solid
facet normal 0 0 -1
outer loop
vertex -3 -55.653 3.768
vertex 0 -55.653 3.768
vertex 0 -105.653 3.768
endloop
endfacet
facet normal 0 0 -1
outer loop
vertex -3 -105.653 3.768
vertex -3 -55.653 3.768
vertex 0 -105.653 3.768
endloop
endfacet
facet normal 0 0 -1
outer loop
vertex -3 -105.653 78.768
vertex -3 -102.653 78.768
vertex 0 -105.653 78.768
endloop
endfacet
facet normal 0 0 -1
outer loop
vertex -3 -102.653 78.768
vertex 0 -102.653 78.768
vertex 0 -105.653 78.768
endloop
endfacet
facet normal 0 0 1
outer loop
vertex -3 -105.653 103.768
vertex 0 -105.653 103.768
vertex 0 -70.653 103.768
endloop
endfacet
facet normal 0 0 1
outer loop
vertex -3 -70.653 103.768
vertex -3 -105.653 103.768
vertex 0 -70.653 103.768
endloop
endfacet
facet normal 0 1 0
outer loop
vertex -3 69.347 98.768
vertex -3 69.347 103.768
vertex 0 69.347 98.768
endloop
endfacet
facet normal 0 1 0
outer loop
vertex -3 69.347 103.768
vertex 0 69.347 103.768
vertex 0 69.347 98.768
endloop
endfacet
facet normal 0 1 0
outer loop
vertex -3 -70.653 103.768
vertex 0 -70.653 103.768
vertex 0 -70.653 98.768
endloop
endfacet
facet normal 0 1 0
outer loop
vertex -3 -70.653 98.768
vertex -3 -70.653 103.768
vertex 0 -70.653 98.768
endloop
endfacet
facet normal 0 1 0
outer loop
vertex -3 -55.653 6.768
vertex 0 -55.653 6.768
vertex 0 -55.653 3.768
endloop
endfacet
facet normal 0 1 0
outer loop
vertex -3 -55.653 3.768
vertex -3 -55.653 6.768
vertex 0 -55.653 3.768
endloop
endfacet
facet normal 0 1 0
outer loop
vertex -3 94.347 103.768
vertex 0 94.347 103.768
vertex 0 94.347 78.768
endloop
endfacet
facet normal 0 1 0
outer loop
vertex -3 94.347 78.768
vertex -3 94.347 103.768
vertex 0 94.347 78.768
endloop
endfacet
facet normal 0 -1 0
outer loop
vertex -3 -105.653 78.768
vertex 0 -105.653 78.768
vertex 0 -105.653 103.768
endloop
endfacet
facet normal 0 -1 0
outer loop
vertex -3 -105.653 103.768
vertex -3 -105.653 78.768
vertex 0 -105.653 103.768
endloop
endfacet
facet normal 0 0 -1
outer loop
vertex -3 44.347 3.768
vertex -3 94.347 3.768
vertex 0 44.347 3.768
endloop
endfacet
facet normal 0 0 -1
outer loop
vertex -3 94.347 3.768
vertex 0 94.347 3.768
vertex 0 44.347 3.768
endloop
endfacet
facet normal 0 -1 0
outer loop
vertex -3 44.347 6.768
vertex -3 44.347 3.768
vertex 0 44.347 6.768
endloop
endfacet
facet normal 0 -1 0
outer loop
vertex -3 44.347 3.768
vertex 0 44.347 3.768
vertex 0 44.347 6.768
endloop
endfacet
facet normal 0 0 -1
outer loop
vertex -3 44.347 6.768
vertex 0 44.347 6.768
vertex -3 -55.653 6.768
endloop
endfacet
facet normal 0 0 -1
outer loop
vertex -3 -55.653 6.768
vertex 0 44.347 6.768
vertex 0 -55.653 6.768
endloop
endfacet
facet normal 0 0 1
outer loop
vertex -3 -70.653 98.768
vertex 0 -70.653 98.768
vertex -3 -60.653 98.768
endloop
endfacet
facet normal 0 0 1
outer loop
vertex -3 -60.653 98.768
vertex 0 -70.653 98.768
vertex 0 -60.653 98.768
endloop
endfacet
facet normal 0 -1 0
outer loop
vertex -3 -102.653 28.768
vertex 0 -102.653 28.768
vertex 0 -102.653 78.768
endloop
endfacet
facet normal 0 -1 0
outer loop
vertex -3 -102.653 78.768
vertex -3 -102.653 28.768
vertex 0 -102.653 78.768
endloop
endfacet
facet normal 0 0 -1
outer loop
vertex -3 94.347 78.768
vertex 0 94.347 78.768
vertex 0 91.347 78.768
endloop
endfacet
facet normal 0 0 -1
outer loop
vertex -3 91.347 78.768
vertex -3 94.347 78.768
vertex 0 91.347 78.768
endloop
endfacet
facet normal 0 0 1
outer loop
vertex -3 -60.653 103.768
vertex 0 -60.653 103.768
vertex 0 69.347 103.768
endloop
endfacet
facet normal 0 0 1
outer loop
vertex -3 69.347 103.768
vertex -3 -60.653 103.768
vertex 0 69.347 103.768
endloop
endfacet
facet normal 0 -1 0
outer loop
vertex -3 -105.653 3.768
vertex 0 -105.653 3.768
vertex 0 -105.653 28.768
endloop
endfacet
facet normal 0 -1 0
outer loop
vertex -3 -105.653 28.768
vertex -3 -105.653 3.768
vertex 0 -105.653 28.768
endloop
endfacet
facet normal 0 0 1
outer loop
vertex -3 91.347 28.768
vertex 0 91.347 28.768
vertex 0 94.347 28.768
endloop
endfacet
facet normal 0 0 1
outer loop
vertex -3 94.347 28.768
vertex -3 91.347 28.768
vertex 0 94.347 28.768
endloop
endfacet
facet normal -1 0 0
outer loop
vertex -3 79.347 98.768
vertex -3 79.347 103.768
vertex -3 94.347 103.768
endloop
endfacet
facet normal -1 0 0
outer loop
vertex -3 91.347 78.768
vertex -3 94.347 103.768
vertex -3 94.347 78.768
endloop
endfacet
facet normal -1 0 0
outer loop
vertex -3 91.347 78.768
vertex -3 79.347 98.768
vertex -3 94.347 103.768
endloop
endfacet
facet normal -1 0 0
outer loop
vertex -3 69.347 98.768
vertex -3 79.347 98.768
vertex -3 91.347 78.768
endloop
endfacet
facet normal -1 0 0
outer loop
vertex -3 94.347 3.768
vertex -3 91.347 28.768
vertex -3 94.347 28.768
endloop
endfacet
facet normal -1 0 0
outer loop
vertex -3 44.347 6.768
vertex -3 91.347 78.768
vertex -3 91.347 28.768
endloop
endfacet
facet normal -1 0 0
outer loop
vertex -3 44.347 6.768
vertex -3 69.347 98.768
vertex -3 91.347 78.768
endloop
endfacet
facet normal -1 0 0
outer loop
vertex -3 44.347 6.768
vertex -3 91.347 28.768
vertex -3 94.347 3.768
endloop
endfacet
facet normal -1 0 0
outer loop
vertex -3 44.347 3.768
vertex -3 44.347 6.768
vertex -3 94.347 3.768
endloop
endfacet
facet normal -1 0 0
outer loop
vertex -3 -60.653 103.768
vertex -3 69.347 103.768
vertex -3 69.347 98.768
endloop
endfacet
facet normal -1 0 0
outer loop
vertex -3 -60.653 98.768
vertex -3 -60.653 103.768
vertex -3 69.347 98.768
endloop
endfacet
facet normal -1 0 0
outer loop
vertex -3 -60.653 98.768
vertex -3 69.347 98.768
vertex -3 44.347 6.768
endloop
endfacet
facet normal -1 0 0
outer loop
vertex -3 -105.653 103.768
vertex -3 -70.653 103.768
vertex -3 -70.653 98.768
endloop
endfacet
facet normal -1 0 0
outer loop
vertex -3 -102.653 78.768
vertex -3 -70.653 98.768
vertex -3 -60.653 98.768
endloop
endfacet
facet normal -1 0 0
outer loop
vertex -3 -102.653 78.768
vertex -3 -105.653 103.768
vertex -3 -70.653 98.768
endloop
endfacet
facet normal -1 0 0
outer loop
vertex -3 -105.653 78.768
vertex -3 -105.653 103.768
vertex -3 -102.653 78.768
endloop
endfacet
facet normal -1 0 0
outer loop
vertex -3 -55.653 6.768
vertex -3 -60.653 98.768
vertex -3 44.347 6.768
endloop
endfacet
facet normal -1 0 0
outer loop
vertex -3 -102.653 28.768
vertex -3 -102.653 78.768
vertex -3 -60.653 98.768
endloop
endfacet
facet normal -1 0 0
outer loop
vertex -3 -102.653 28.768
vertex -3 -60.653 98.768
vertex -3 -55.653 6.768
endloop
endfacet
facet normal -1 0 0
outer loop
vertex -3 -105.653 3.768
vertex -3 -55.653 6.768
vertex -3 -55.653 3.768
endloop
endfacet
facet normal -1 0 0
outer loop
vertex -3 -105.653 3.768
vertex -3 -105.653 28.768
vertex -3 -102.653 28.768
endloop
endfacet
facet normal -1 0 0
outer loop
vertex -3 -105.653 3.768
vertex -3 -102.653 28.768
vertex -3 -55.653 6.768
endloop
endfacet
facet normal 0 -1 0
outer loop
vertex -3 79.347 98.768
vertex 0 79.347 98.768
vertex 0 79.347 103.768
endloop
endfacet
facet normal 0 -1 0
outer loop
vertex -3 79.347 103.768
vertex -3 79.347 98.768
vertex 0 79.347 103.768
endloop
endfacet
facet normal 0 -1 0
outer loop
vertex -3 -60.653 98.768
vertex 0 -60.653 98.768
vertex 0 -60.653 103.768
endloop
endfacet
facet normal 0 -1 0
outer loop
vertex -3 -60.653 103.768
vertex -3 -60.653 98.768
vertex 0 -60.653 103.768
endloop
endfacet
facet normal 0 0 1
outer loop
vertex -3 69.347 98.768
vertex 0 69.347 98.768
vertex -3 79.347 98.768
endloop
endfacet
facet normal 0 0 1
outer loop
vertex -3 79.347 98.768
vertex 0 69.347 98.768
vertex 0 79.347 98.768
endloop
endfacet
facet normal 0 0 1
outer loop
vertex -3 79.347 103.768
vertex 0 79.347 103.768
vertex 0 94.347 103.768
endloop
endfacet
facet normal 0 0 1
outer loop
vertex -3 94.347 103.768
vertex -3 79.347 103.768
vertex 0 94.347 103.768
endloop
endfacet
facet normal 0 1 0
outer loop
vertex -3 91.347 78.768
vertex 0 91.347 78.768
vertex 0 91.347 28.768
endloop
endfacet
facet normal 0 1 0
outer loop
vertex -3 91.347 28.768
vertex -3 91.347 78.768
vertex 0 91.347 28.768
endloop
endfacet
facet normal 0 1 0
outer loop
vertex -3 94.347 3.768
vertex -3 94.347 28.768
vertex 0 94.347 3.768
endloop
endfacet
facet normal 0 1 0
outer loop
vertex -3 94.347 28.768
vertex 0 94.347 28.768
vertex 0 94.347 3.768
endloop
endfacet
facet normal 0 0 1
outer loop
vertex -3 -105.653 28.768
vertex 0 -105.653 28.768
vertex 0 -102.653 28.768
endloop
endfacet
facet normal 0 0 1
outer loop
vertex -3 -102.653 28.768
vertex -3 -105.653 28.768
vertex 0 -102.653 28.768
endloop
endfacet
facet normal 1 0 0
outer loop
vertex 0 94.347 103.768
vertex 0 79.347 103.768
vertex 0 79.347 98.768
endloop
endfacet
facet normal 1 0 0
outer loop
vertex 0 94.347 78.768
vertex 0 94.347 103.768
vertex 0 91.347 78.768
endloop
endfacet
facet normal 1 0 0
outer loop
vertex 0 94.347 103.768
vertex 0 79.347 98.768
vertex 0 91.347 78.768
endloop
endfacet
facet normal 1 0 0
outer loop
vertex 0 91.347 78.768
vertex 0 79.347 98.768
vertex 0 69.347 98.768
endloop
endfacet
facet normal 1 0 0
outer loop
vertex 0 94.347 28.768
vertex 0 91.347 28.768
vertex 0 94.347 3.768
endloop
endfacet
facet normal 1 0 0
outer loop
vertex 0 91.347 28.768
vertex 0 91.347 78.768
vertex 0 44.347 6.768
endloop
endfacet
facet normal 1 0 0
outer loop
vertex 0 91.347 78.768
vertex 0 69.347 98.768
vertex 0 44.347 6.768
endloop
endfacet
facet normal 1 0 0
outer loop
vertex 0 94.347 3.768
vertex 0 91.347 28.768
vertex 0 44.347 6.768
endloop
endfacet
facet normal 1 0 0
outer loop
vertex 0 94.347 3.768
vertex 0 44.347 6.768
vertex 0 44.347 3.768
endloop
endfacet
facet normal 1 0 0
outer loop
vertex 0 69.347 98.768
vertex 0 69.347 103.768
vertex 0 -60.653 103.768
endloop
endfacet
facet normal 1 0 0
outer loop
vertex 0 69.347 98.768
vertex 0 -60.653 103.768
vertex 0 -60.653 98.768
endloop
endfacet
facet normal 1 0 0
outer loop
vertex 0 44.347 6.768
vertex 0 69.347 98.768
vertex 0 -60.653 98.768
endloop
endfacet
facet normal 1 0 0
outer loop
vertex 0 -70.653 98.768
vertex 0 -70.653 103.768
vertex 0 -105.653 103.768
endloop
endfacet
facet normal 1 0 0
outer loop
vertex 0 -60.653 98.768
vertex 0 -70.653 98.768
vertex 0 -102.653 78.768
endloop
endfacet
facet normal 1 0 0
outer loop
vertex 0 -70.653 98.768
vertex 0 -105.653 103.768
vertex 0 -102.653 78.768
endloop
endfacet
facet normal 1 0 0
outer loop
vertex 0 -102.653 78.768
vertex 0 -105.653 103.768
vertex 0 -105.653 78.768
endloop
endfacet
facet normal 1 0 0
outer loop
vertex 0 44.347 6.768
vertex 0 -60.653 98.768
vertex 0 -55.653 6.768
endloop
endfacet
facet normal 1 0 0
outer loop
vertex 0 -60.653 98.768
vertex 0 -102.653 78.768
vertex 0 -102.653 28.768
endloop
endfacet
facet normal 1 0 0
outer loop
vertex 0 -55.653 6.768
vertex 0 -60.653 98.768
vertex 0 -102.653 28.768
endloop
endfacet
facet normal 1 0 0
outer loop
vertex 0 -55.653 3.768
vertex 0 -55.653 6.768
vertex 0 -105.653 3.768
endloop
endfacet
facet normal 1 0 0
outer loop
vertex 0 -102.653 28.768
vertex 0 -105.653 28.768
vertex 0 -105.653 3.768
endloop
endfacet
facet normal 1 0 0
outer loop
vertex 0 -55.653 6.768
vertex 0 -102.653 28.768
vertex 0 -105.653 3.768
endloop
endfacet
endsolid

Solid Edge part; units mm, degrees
sketch "Sketch1" plane through (0, 0, 0) normal (1, 0, 0) x (0, 1, 0)
  line L0 (-105.6532, 103.7678) -> (-70.6532, 103.7678)
  line L1 (-70.6532, 103.7678) -> (-70.6532, 98.7678)
  line L2 (-70.6532, 98.7678) -> (-60.6532, 98.7678)
  line L3 (-60.6532, 98.7678) -> (-60.6532, 103.7678)
  line L4 (-60.6532, 103.7678) -> (69.3468, 103.7678)
  line L5 (69.3468, 103.7678) -> (69.3468, 98.7678)
  line L6 (69.3468, 98.7678) -> (79.3468, 98.7678)
  line L7 (79.3468, 98.7678) -> (79.3468, 103.7678)
  line L8 (79.3468, 103.7678) -> (94.3468, 103.7678)
  line L9 (94.3468, 103.7678) -> (94.3468, 78.7678)
  line L10 (94.3468, 78.7678) -> (91.3468, 78.7678)
  line L11 (91.3468, 78.7678) -> (91.3468, 28.7678)
  line L12 (91.3468, 28.7678) -> (94.3468, 28.7678)
  line L13 (94.3468, 28.7678) -> (94.3468, 3.7678)
  line L14 (94.3468, 3.7678) -> (44.3468, 3.7678)
  line L15 (44.3468, 3.7678) -> (44.3468, 6.7678)
  line L16 (44.3468, 6.7678) -> (-55.6532, 6.7678)
  line L17 (-55.6532, 6.7678) -> (-55.6532, 3.7678)
  line L18 (-55.6532, 3.7678) -> (-105.6532, 3.7678)
  line L19 (-105.6532, 3.7678) -> (-105.6532, 28.7678)
  line L20 (-105.6532, 28.7678) -> (-102.6532, 28.7678)
  line L21 (-102.6532, 28.7678) -> (-102.6532, 78.7678)
  line L22 (-102.6532, 78.7678) -> (-105.6532, 78.7678)
  line L23 (-105.6532, 78.7678) -> (-105.6532, 103.7678)
  dimension "D1" = 5
  dimension "D2" = 200
  dimension "D3" = 100
  dimension "D4" = 100
  dimension "D5" = 50
  dimension "D6" = 25
  dimension "D7" = 130
  dimension "D8" = 35
  dimension "D9" = 3
  dimension "D10" = 10
extrude "Protrusion1" add sketch "Sketch1" against normal blind 3
properties material "Acier"
